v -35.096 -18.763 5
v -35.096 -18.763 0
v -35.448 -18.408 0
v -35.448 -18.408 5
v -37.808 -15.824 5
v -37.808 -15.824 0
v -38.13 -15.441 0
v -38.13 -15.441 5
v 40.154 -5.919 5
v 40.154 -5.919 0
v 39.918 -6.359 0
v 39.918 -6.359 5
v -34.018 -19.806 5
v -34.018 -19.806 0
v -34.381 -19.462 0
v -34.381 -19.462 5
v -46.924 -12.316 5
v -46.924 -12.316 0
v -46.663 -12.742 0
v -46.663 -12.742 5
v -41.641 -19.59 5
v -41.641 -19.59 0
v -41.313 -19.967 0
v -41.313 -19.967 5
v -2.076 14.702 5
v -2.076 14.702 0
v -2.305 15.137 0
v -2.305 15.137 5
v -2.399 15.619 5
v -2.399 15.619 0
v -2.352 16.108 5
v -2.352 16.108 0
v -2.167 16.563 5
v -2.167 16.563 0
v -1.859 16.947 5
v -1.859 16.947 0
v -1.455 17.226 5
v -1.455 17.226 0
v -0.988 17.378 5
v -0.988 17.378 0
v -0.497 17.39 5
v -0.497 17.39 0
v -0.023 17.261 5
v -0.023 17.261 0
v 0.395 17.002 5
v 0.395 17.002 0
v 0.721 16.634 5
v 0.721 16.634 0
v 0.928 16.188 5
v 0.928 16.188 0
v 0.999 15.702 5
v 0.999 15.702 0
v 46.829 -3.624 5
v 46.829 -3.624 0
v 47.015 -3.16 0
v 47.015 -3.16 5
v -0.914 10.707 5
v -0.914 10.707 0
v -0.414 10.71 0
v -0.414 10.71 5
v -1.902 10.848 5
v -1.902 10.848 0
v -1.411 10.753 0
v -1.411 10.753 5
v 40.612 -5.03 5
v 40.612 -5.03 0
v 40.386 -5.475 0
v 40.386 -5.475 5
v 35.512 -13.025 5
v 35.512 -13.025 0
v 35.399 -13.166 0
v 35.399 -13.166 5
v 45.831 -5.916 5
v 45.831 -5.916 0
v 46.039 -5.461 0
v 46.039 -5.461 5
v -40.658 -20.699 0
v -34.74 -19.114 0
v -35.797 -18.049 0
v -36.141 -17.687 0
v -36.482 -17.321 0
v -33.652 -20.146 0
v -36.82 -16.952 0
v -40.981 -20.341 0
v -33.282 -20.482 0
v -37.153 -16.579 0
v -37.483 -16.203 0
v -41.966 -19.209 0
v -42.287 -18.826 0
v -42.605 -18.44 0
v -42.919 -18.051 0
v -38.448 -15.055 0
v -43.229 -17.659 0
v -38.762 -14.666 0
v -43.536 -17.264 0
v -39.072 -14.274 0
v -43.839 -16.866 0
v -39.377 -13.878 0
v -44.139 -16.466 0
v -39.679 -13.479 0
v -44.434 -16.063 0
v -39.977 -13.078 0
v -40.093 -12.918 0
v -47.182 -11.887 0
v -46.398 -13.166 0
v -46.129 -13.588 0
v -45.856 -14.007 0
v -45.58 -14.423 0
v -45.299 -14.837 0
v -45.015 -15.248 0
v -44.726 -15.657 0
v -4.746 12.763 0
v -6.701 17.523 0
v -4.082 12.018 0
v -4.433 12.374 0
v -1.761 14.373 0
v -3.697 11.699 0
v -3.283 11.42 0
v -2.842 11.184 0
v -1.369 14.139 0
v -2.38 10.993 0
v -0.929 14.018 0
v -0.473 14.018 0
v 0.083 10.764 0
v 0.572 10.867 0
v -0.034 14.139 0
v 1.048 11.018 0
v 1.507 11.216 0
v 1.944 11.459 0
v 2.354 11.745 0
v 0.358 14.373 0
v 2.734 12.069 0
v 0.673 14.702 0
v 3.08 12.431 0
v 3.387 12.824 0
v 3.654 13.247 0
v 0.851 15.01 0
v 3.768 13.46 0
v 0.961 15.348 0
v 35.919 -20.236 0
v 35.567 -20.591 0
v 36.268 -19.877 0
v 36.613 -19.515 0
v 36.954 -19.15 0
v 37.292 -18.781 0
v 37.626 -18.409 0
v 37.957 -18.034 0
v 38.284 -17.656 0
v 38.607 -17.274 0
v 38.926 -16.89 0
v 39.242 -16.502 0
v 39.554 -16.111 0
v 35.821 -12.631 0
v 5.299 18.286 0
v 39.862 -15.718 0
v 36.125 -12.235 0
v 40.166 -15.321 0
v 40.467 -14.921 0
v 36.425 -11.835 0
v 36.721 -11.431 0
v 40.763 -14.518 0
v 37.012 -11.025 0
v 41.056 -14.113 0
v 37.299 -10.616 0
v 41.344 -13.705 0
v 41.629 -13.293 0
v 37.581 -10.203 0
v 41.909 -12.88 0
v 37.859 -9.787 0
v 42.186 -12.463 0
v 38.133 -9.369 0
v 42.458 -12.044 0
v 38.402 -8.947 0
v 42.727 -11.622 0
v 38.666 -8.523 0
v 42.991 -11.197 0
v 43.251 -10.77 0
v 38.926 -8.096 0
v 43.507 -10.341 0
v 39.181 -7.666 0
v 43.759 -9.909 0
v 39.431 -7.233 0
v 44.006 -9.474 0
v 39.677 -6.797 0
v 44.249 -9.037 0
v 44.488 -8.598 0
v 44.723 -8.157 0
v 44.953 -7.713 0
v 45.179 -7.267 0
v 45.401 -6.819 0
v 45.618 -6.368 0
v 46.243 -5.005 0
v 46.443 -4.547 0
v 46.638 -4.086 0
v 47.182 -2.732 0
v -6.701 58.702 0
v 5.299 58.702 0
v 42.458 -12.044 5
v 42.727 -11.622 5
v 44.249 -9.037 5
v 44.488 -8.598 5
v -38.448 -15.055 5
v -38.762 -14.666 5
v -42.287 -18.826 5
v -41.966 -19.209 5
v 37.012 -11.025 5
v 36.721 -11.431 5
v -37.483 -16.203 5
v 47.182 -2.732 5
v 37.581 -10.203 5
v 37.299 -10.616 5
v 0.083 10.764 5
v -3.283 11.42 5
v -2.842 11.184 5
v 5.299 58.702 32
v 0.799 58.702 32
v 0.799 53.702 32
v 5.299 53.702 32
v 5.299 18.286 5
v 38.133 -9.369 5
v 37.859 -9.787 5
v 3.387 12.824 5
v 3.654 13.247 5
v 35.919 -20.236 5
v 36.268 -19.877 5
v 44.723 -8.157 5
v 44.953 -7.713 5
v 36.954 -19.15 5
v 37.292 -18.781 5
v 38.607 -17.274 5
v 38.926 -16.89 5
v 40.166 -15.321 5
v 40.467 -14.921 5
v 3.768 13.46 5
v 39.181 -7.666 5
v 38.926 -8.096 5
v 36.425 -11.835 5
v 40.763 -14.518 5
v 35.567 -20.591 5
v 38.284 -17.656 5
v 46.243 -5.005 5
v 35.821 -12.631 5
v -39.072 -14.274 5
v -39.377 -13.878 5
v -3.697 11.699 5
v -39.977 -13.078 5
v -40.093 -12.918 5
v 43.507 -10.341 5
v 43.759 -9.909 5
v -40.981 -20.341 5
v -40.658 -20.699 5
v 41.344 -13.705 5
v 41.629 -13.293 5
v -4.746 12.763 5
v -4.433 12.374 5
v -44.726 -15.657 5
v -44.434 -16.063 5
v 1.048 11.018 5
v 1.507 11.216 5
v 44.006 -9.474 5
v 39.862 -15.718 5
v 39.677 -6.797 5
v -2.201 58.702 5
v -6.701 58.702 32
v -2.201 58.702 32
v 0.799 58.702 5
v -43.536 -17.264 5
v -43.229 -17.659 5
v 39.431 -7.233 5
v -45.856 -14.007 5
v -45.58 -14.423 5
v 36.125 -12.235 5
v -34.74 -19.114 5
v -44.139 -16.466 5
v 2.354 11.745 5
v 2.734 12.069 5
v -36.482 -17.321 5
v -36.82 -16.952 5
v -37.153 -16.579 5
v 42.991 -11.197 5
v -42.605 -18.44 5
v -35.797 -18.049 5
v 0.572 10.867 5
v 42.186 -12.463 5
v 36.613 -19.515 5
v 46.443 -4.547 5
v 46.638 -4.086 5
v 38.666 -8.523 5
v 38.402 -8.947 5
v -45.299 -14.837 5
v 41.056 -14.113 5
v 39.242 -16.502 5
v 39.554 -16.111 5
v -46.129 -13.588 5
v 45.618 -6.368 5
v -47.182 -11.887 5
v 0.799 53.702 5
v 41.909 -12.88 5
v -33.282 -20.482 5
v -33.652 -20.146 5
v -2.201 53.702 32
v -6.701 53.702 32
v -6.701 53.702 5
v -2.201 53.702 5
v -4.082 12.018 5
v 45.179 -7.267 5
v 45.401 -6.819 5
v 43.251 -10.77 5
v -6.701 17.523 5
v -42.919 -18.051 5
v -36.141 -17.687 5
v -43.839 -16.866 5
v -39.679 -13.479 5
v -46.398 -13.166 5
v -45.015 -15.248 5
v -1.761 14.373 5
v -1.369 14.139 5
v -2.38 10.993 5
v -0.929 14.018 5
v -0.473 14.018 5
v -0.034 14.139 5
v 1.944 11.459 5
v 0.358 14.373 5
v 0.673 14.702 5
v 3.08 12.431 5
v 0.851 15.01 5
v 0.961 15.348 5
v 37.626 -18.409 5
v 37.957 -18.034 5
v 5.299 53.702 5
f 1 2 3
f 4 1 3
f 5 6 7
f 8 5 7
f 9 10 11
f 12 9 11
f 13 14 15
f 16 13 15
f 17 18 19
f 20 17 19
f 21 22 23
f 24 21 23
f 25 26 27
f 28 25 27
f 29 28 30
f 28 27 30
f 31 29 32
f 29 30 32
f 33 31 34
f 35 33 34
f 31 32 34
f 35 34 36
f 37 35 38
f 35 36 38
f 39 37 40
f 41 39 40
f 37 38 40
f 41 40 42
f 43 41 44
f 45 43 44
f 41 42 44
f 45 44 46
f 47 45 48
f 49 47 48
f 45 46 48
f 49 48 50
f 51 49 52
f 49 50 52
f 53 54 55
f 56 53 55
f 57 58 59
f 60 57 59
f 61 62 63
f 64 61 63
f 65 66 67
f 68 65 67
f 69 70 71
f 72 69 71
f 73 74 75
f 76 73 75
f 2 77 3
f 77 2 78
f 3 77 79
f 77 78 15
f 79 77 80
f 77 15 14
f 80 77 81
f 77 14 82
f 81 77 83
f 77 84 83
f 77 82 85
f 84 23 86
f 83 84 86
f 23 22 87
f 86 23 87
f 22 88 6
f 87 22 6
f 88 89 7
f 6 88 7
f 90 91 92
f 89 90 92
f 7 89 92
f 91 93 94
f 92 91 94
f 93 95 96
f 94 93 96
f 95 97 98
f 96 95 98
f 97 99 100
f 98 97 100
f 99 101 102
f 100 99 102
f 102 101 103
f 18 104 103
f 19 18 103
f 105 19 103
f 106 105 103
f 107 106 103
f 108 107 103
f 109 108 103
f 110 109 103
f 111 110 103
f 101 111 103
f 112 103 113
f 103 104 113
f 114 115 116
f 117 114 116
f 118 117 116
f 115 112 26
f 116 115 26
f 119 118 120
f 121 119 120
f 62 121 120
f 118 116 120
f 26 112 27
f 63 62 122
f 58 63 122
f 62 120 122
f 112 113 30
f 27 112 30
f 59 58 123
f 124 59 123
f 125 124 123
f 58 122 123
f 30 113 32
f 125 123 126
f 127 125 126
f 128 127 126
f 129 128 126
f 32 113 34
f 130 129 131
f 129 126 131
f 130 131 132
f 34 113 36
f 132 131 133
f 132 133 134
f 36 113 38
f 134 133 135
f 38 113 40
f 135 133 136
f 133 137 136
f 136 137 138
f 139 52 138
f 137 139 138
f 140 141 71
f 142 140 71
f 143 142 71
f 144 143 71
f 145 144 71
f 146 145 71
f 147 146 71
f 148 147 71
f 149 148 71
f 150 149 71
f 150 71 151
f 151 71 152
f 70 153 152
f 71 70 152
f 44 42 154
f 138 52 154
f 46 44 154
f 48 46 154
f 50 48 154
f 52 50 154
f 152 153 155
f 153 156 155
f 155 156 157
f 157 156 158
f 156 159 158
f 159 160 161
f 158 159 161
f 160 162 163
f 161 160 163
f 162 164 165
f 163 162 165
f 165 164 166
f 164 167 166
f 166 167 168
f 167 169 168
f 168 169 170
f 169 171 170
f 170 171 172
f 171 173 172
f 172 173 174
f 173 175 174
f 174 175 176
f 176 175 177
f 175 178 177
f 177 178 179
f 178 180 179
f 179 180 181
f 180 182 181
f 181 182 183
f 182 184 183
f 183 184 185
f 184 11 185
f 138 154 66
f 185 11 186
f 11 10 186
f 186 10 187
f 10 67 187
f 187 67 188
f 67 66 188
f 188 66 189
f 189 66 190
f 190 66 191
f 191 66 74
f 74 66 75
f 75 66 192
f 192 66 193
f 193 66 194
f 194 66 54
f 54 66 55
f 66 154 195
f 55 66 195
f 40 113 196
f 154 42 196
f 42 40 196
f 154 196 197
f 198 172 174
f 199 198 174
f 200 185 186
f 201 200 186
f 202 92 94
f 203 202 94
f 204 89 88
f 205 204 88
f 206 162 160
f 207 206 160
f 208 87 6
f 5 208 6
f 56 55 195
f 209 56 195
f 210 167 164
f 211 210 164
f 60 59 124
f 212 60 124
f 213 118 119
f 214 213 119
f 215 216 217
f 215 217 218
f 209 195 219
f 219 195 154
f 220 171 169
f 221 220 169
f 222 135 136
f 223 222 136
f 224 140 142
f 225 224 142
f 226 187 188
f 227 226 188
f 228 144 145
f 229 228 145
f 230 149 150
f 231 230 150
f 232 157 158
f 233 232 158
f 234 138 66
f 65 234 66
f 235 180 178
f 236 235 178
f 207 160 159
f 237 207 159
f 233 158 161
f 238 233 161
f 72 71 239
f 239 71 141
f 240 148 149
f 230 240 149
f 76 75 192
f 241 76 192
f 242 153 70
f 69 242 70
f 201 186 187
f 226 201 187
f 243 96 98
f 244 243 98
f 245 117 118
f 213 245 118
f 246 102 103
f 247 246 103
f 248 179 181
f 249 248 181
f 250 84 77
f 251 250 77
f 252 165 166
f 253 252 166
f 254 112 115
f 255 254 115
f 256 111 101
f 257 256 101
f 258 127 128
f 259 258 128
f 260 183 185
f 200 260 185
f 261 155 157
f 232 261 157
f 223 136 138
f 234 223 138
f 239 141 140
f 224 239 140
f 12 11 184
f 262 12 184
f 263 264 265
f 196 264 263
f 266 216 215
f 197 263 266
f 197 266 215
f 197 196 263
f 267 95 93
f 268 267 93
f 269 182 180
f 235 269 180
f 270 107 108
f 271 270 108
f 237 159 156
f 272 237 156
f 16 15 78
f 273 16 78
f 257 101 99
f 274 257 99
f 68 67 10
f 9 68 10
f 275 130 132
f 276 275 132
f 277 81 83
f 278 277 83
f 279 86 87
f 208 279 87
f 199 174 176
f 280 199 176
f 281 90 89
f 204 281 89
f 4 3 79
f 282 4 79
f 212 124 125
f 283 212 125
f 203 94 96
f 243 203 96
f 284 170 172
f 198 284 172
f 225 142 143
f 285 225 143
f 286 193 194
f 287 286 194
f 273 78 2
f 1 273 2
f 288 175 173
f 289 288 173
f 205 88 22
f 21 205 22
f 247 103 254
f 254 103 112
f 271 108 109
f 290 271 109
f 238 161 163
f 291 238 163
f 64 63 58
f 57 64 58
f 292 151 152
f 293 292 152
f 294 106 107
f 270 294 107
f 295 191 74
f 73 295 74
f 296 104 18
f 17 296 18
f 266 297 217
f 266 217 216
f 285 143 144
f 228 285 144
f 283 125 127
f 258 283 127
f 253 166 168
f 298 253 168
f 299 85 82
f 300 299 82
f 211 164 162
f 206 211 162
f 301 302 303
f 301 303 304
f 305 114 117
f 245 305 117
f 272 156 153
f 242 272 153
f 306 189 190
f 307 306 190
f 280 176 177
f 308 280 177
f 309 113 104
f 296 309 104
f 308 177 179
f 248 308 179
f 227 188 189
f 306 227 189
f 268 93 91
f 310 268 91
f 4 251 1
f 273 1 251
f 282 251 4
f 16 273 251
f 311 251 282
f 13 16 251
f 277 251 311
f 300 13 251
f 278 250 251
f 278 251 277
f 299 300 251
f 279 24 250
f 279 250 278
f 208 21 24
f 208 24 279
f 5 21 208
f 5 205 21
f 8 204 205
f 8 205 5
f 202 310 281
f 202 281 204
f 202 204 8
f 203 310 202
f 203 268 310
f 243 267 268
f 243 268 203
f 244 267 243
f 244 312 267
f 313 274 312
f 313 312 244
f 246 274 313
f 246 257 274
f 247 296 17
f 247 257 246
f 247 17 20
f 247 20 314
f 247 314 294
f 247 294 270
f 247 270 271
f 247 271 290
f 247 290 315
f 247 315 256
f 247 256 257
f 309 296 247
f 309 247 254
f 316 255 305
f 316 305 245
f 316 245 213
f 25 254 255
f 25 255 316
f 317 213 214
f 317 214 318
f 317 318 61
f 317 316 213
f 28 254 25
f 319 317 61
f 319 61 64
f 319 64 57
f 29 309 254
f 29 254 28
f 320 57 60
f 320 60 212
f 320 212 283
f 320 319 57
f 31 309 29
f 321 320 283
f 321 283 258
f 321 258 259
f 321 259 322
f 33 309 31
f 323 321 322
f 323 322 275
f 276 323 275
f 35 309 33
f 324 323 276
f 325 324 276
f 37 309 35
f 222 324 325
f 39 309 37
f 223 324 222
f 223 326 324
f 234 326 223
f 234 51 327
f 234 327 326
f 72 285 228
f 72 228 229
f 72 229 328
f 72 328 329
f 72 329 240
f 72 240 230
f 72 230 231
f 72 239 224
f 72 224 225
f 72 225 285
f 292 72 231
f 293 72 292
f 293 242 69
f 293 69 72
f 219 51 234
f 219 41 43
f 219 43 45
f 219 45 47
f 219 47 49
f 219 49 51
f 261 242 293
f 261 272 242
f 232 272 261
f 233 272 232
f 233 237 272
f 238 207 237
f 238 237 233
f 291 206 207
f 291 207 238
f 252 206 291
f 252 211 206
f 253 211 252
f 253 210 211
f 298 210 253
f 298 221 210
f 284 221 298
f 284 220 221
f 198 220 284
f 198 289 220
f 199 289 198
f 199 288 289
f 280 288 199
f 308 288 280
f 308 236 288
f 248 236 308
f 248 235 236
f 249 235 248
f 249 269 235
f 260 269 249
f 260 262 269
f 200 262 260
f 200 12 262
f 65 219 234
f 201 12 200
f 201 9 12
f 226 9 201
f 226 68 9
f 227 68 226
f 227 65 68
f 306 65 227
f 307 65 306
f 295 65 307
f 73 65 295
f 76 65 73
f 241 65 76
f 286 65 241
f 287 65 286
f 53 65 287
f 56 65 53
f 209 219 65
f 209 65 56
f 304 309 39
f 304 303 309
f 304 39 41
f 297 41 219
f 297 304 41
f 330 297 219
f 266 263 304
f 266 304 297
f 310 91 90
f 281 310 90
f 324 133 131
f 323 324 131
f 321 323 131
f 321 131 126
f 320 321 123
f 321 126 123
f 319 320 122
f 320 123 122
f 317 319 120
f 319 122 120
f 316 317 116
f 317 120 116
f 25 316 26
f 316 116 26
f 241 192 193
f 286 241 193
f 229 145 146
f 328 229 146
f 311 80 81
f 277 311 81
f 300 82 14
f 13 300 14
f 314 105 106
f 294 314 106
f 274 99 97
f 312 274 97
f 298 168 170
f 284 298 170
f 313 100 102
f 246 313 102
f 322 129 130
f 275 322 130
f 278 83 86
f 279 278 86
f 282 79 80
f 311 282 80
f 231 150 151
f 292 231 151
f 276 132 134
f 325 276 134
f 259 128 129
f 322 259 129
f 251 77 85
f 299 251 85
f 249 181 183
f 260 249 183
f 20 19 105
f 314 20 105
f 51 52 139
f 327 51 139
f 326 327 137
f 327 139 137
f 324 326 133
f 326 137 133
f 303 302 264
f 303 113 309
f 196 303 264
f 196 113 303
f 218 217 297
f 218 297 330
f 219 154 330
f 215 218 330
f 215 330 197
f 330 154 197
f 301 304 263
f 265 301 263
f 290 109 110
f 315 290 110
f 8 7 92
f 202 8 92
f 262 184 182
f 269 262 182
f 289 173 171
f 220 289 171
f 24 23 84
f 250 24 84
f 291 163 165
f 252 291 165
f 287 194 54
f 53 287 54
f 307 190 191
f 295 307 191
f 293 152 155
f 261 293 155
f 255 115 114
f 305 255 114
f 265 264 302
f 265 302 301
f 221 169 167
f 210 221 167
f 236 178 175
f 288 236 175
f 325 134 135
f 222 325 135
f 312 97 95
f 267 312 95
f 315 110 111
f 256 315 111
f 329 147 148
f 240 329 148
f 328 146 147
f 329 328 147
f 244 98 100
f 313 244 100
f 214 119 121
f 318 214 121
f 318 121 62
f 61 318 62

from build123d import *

# Parameters (mm, degrees)
F0_W     = 3
F0_H     = 5
F1_DEPTH = 5
F0_W_2   = 4.5
F2_DEPTH = 32


with BuildPart() as f1:
    # F0 (on Top) → F1 (new body)
    with BuildSketch(Plane.XY):
        with BuildLine():
            Line((47.181574, -2.732137), (5.298654, 18.285511))
            Line((5.298654, 18.285511), (5.298654, 14.702181))
            Line((5.298654, 14.702181), (0.673427, 14.702181))
            ThreePointArc((0.673427, 14.702181), (-0.701346, 14.002181), (-2.076119, 14.702181))
            Line((-2.076119, 14.702181), (-6.701346, 14.702181))
            Line((-6.701346, 14.702181), (-6.701346, 17.523266))
            Line((-6.701346, 17.523266), (-47.181575, -11.887342))
            Line((-47.181575, -11.887342), (-46.924376, -12.316116))
            Line((-46.924376, -12.316116), (-46.663222, -12.742492))
            Line((-46.663222, -12.742492), (-46.398134, -13.166434))
            Line((-46.398134, -13.166434), (-46.129137, -13.587906))
            Line((-46.129137, -13.587906), (-45.856253, -14.006872))
            Line((-45.856253, -14.006872), (-45.579504, -14.423295))
            Line((-45.579504, -14.423295), (-45.298916, -14.837141))
            Line((-45.298916, -14.837141), (-45.014511, -15.248374))
            Line((-45.014511, -15.248374), (-44.726314, -15.656958))
            Line((-44.726314, -15.656958), (-44.434351, -16.062858))
            Line((-44.434351, -16.062858), (-44.138645, -16.466041))
            Line((-44.138645, -16.466041), (-43.839222, -16.866471))
            Line((-43.839222, -16.866471), (-43.536108, -17.264114))
            Line((-43.536108, -17.264114), (-43.229328, -17.658936))
            Line((-43.229328, -17.658936), (-42.91891, -18.050904))
            Line((-42.91891, -18.050904), (-42.604879, -18.439983))
            Line((-42.604879, -18.439983), (-42.287262, -18.826141))
            Line((-42.287262, -18.826141), (-41.966087, -19.209344))
            Line((-41.966087, -19.209344), (-41.641381, -19.58956))
            Line((-41.641381, -19.58956), (-41.313171, -19.966756))
            Line((-41.313171, -19.966756), (-40.981487, -20.3409))
            Line((-40.981487, -20.3409), (-40.658041, -20.699137))
            Line((-40.658041, -20.699137), (-33.282088, -20.482399))
            Line((-33.282088, -20.482399), (-33.651937, -20.145932))
            Line((-33.651937, -20.145932), (-34.01831, -19.805685))
            Line((-34.01831, -19.805685), (-34.38117, -19.461693))
            Line((-34.38117, -19.461693), (-34.740479, -19.113994))
            Line((-34.740479, -19.113994), (-35.096199, -18.762623))
            Line((-35.096199, -18.762623), (-35.448292, -18.407618))
            Line((-35.448292, -18.407618), (-35.79672, -18.049016))
            Line((-35.79672, -18.049016), (-36.141448, -17.686856))
            Line((-36.141448, -17.686856), (-36.482439, -17.321174))
            Line((-36.482439, -17.321174), (-36.819657, -16.95201))
            Line((-36.819657, -16.95201), (-37.153067, -16.579403))
            Line((-37.153067, -16.579403), (-37.482632, -16.203392))
            Line((-37.482632, -16.203392), (-37.808319, -15.824017))
            Line((-37.808319, -15.824017), (-38.130094, -15.441317))
            Line((-38.130094, -15.441317), (-38.447921, -15.055333))
            Line((-38.447921, -15.055333), (-38.761768, -14.666106))
            Line((-38.761768, -14.666106), (-39.071602, -14.273677))
            Line((-39.071602, -14.273677), (-39.37739, -13.878087))
            Line((-39.37739, -13.878087), (-39.6791, -13.479377))
            Line((-39.6791, -13.479377), (-39.976699, -13.077591))
            Line((-39.976699, -13.077591), (-40.093318, -12.917762))
            Line((-40.093318, -12.917762), (-4.746431, 12.763255))
            Line((-4.746431, 12.763255), (-4.432819, 12.374102))
            Line((-4.432819, 12.374102), (-4.081924, 12.018203))
            Line((-4.081924, 12.018203), (-3.697251, 11.699113))
            Line((-3.697251, 11.699113), (-3.282644, 11.42002))
            Line((-3.282644, 11.42002), (-2.842246, 11.183714))
            Line((-2.842246, 11.183714), (-2.380456, 10.992554))
            Line((-2.380456, 10.992554), (-1.901889, 10.848451))
            Line((-1.901889, 10.848451), (-1.411327, 10.752845))
            Line((-1.411327, 10.752845), (-0.913671, 10.706691))
            Line((-0.913671, 10.706691), (-0.413894, 10.710451))
            Line((-0.413894, 10.710451), (0.083012, 10.764086))
            Line((0.083012, 10.764086), (0.57208, 10.867061))
            Line((0.57208, 10.867061), (1.048425, 11.018347))
            Line((1.048425, 11.018347), (1.507287, 11.216432))
            Line((1.507287, 11.216432), (1.94408, 11.459338))
            Line((1.94408, 11.459338), (2.354442, 11.744636))
            Line((2.354442, 11.744636), (2.734271, 12.069477))
            Line((2.734271, 12.069477), (3.079772, 12.430615))
            Line((3.079772, 12.430615), (3.387494, 12.824441))
            Line((3.387494, 12.824441), (3.654361, 13.247021))
            Line((3.654361, 13.247021), (3.767534, 13.459612))
            Line((3.767534, 13.459612), (40.612321, -5.029804))
            Line((40.612321, -5.029804), (40.385651, -5.47547))
            Line((40.385651, -5.47547), (40.154175, -5.918659))
            Line((40.154175, -5.918659), (39.917917, -6.359317))
            Line((39.917917, -6.359317), (39.676907, -6.797395))
            Line((39.676907, -6.797395), (39.431173, -7.23284))
            Line((39.431173, -7.23284), (39.180743, -7.665601))
            Line((39.180743, -7.665601), (38.925647, -8.095628))
            Line((38.925647, -8.095628), (38.665914, -8.522871))
            Line((38.665914, -8.522871), (38.401574, -8.947279))
            Line((38.401574, -8.947279), (38.13266, -9.368803))
            Line((38.13266, -9.368803), (37.859202, -9.787394))
            Line((37.859202, -9.787394), (37.581232, -10.203002))
            Line((37.581232, -10.203002), (37.298782, -10.615579))
            Line((37.298782, -10.615579), (37.011887, -11.025077))
            Line((37.011887, -11.025077), (36.720579, -11.431448))
            Line((36.720579, -11.431448), (36.424892, -11.834644))
            Line((36.424892, -11.834644), (36.124861, -12.234618))
            Line((36.124861, -12.234618), (35.820522, -12.631323))
            Line((35.820522, -12.631323), (35.511909, -13.024713))
            Line((35.511909, -13.024713), (35.399096, -13.166355))
            Line((35.399096, -13.166355), (35.567373, -20.590768))
            Line((35.567373, -20.590768), (35.919316, -20.235615))
            Line((35.919316, -20.235615), (36.267782, -19.87705))
            Line((36.267782, -19.87705), (36.612738, -19.515105))
            Line((36.612738, -19.515105), (36.95415, -19.149817))
            Line((36.95415, -19.149817), (37.291986, -18.781218))
            Line((37.291986, -18.781218), (37.626214, -18.409345))
            Line((37.626214, -18.409345), (37.956803, -18.034233))
            Line((37.956803, -18.034233), (38.28372, -17.655917))
            Line((38.28372, -17.655917), (38.606936, -17.274433))
            Line((38.606936, -17.274433), (38.926418, -16.889818))
            Line((38.926418, -16.889818), (39.242138, -16.502108))
            Line((39.242138, -16.502108), (39.554064, -16.111339))
            Line((39.554064, -16.111339), (39.862168, -15.71755))
            Line((39.862168, -15.71755), (40.166419, -15.320776))
            Line((40.166419, -15.320776), (40.46679, -14.921057))
            Line((40.46679, -14.921057), (40.763251, -14.51843))
            Line((40.763251, -14.51843), (41.055775, -14.112933))
            Line((41.055775, -14.112933), (41.344333, -13.704604))
            Line((41.344333, -13.704604), (41.628898, -13.293483))
            Line((41.628898, -13.293483), (41.909444, -12.879608))
            Line((41.909444, -12.879608), (42.185943, -12.46302))
            Line((42.185943, -12.46302), (42.45837, -12.043756))
            Line((42.45837, -12.043756), (42.726698, -11.621858))
            Line((42.726698, -11.621858), (42.990902, -11.197365))
            Line((42.990902, -11.197365), (43.250957, -10.770318))
            Line((43.250957, -10.770318), (43.506838, -10.340757))
            Line((43.506838, -10.340757), (43.758521, -9.908722))
            Line((43.758521, -9.908722), (44.005982, -9.474256))
            Line((44.005982, -9.474256), (44.249197, -9.037398))
            Line((44.249197, -9.037398), (44.488144, -8.598192))
            Line((44.488144, -8.598192), (44.722799, -8.156678))
            Line((44.722799, -8.156678), (44.953141, -7.712898))
            Line((44.953141, -7.712898), (45.179148, -7.266894))
            Line((45.179148, -7.266894), (45.400797, -6.818709))
            Line((45.400797, -6.818709), (45.618069, -6.368386))
            Line((45.618069, -6.368386), (45.830942, -5.915967))
            Line((45.830942, -5.915967), (46.039396, -5.461495))
            Line((46.039396, -5.461495), (46.243411, -5.005013))
            Line((46.243411, -5.005013), (46.442969, -4.546565))
            Line((46.442969, -4.546565), (46.638049, -4.086193))
            Line((46.638049, -4.086193), (46.828634, -3.623943))
            Line((46.828634, -3.623943), (47.014706, -3.159858))
            Line((47.014706, -3.159858), (47.181574, -2.732137))
        make_face()
        with BuildLine():
            Line((5.298654, 14.702181), (5.298654, 18.285511))
            Line((5.298654, 18.285511), (1.541223, 20.171061))
            Line((1.541223, 20.171061), (1.083876, 20.372618))
            Line((1.083876, 20.372618), (0.608691, 20.52751))
            Line((0.608691, 20.52751), (0.120418, 20.634189))
            Line((0.120418, 20.634189), (-0.376067, 20.691589))
            Line((-0.376067, 20.691589), (-0.875802, 20.699137))
            Line((-0.875802, 20.699137), (-1.373793, 20.656756))
            Line((-1.373793, 20.656756), (-1.865066, 20.564871))
            Line((-1.865066, 20.564871), (-2.344711, 20.4244))
            Line((-2.344711, 20.4244), (-2.807936, 20.236746))
            Line((-2.807936, 20.236746), (-3.250113, 20.003784))
            Line((-3.250113, 20.003784), (-3.640272, 19.747266))
            Line((-3.640272, 19.747266), (-6.701346, 17.523266))
            Line((-6.701346, 17.523266), (-6.701346, 14.702181))
            Line((-6.701346, 14.702181), (-2.076119, 14.702181))
            ThreePointArc((-2.076119, 14.702181), (-1.227125, 17.318831), (0.998654, 15.702181))
            ThreePointArc((0.998654, 15.702181), (0.915304, 15.176402), (0.673427, 14.702181))
            Line((0.673427, 14.702181), (5.298654, 14.702181))
        make_face()
        Polygon((5.298654, 53.702181), (0.798654, 53.702181), (-2.201346, 53.702181), (-6.701346, 53.702181), (-6.701346, 17.523266), (-3.640272, 19.747266), (-3.250113, 20.003784), (-2.807936, 20.236746), (-2.344711, 20.4244), (-1.865066, 20.564871), (-1.373793, 20.656756), (-0.875802, 20.699137), (-0.376067, 20.691589), (0.120418, 20.634189), (0.608691, 20.52751), (1.083876, 20.372618), (1.541223, 20.171061), (5.298654, 18.285511), align=None)
        with Locations((-0.701346, 56.202181)):
            Rectangle(F0_W, F0_H)
    extrude(amount=F1_DEPTH)

    # F0 (on Top) → F2 (join)
    with BuildSketch(Plane.XY):
        with Locations((-4.451346, 56.202181)):
            Rectangle(F0_W_2, F0_H)
        with Locations((3.048654, 56.202181)):
            Rectangle(F0_W_2, F0_H)
    extrude(amount=F2_DEPTH)


solid = f1.part
